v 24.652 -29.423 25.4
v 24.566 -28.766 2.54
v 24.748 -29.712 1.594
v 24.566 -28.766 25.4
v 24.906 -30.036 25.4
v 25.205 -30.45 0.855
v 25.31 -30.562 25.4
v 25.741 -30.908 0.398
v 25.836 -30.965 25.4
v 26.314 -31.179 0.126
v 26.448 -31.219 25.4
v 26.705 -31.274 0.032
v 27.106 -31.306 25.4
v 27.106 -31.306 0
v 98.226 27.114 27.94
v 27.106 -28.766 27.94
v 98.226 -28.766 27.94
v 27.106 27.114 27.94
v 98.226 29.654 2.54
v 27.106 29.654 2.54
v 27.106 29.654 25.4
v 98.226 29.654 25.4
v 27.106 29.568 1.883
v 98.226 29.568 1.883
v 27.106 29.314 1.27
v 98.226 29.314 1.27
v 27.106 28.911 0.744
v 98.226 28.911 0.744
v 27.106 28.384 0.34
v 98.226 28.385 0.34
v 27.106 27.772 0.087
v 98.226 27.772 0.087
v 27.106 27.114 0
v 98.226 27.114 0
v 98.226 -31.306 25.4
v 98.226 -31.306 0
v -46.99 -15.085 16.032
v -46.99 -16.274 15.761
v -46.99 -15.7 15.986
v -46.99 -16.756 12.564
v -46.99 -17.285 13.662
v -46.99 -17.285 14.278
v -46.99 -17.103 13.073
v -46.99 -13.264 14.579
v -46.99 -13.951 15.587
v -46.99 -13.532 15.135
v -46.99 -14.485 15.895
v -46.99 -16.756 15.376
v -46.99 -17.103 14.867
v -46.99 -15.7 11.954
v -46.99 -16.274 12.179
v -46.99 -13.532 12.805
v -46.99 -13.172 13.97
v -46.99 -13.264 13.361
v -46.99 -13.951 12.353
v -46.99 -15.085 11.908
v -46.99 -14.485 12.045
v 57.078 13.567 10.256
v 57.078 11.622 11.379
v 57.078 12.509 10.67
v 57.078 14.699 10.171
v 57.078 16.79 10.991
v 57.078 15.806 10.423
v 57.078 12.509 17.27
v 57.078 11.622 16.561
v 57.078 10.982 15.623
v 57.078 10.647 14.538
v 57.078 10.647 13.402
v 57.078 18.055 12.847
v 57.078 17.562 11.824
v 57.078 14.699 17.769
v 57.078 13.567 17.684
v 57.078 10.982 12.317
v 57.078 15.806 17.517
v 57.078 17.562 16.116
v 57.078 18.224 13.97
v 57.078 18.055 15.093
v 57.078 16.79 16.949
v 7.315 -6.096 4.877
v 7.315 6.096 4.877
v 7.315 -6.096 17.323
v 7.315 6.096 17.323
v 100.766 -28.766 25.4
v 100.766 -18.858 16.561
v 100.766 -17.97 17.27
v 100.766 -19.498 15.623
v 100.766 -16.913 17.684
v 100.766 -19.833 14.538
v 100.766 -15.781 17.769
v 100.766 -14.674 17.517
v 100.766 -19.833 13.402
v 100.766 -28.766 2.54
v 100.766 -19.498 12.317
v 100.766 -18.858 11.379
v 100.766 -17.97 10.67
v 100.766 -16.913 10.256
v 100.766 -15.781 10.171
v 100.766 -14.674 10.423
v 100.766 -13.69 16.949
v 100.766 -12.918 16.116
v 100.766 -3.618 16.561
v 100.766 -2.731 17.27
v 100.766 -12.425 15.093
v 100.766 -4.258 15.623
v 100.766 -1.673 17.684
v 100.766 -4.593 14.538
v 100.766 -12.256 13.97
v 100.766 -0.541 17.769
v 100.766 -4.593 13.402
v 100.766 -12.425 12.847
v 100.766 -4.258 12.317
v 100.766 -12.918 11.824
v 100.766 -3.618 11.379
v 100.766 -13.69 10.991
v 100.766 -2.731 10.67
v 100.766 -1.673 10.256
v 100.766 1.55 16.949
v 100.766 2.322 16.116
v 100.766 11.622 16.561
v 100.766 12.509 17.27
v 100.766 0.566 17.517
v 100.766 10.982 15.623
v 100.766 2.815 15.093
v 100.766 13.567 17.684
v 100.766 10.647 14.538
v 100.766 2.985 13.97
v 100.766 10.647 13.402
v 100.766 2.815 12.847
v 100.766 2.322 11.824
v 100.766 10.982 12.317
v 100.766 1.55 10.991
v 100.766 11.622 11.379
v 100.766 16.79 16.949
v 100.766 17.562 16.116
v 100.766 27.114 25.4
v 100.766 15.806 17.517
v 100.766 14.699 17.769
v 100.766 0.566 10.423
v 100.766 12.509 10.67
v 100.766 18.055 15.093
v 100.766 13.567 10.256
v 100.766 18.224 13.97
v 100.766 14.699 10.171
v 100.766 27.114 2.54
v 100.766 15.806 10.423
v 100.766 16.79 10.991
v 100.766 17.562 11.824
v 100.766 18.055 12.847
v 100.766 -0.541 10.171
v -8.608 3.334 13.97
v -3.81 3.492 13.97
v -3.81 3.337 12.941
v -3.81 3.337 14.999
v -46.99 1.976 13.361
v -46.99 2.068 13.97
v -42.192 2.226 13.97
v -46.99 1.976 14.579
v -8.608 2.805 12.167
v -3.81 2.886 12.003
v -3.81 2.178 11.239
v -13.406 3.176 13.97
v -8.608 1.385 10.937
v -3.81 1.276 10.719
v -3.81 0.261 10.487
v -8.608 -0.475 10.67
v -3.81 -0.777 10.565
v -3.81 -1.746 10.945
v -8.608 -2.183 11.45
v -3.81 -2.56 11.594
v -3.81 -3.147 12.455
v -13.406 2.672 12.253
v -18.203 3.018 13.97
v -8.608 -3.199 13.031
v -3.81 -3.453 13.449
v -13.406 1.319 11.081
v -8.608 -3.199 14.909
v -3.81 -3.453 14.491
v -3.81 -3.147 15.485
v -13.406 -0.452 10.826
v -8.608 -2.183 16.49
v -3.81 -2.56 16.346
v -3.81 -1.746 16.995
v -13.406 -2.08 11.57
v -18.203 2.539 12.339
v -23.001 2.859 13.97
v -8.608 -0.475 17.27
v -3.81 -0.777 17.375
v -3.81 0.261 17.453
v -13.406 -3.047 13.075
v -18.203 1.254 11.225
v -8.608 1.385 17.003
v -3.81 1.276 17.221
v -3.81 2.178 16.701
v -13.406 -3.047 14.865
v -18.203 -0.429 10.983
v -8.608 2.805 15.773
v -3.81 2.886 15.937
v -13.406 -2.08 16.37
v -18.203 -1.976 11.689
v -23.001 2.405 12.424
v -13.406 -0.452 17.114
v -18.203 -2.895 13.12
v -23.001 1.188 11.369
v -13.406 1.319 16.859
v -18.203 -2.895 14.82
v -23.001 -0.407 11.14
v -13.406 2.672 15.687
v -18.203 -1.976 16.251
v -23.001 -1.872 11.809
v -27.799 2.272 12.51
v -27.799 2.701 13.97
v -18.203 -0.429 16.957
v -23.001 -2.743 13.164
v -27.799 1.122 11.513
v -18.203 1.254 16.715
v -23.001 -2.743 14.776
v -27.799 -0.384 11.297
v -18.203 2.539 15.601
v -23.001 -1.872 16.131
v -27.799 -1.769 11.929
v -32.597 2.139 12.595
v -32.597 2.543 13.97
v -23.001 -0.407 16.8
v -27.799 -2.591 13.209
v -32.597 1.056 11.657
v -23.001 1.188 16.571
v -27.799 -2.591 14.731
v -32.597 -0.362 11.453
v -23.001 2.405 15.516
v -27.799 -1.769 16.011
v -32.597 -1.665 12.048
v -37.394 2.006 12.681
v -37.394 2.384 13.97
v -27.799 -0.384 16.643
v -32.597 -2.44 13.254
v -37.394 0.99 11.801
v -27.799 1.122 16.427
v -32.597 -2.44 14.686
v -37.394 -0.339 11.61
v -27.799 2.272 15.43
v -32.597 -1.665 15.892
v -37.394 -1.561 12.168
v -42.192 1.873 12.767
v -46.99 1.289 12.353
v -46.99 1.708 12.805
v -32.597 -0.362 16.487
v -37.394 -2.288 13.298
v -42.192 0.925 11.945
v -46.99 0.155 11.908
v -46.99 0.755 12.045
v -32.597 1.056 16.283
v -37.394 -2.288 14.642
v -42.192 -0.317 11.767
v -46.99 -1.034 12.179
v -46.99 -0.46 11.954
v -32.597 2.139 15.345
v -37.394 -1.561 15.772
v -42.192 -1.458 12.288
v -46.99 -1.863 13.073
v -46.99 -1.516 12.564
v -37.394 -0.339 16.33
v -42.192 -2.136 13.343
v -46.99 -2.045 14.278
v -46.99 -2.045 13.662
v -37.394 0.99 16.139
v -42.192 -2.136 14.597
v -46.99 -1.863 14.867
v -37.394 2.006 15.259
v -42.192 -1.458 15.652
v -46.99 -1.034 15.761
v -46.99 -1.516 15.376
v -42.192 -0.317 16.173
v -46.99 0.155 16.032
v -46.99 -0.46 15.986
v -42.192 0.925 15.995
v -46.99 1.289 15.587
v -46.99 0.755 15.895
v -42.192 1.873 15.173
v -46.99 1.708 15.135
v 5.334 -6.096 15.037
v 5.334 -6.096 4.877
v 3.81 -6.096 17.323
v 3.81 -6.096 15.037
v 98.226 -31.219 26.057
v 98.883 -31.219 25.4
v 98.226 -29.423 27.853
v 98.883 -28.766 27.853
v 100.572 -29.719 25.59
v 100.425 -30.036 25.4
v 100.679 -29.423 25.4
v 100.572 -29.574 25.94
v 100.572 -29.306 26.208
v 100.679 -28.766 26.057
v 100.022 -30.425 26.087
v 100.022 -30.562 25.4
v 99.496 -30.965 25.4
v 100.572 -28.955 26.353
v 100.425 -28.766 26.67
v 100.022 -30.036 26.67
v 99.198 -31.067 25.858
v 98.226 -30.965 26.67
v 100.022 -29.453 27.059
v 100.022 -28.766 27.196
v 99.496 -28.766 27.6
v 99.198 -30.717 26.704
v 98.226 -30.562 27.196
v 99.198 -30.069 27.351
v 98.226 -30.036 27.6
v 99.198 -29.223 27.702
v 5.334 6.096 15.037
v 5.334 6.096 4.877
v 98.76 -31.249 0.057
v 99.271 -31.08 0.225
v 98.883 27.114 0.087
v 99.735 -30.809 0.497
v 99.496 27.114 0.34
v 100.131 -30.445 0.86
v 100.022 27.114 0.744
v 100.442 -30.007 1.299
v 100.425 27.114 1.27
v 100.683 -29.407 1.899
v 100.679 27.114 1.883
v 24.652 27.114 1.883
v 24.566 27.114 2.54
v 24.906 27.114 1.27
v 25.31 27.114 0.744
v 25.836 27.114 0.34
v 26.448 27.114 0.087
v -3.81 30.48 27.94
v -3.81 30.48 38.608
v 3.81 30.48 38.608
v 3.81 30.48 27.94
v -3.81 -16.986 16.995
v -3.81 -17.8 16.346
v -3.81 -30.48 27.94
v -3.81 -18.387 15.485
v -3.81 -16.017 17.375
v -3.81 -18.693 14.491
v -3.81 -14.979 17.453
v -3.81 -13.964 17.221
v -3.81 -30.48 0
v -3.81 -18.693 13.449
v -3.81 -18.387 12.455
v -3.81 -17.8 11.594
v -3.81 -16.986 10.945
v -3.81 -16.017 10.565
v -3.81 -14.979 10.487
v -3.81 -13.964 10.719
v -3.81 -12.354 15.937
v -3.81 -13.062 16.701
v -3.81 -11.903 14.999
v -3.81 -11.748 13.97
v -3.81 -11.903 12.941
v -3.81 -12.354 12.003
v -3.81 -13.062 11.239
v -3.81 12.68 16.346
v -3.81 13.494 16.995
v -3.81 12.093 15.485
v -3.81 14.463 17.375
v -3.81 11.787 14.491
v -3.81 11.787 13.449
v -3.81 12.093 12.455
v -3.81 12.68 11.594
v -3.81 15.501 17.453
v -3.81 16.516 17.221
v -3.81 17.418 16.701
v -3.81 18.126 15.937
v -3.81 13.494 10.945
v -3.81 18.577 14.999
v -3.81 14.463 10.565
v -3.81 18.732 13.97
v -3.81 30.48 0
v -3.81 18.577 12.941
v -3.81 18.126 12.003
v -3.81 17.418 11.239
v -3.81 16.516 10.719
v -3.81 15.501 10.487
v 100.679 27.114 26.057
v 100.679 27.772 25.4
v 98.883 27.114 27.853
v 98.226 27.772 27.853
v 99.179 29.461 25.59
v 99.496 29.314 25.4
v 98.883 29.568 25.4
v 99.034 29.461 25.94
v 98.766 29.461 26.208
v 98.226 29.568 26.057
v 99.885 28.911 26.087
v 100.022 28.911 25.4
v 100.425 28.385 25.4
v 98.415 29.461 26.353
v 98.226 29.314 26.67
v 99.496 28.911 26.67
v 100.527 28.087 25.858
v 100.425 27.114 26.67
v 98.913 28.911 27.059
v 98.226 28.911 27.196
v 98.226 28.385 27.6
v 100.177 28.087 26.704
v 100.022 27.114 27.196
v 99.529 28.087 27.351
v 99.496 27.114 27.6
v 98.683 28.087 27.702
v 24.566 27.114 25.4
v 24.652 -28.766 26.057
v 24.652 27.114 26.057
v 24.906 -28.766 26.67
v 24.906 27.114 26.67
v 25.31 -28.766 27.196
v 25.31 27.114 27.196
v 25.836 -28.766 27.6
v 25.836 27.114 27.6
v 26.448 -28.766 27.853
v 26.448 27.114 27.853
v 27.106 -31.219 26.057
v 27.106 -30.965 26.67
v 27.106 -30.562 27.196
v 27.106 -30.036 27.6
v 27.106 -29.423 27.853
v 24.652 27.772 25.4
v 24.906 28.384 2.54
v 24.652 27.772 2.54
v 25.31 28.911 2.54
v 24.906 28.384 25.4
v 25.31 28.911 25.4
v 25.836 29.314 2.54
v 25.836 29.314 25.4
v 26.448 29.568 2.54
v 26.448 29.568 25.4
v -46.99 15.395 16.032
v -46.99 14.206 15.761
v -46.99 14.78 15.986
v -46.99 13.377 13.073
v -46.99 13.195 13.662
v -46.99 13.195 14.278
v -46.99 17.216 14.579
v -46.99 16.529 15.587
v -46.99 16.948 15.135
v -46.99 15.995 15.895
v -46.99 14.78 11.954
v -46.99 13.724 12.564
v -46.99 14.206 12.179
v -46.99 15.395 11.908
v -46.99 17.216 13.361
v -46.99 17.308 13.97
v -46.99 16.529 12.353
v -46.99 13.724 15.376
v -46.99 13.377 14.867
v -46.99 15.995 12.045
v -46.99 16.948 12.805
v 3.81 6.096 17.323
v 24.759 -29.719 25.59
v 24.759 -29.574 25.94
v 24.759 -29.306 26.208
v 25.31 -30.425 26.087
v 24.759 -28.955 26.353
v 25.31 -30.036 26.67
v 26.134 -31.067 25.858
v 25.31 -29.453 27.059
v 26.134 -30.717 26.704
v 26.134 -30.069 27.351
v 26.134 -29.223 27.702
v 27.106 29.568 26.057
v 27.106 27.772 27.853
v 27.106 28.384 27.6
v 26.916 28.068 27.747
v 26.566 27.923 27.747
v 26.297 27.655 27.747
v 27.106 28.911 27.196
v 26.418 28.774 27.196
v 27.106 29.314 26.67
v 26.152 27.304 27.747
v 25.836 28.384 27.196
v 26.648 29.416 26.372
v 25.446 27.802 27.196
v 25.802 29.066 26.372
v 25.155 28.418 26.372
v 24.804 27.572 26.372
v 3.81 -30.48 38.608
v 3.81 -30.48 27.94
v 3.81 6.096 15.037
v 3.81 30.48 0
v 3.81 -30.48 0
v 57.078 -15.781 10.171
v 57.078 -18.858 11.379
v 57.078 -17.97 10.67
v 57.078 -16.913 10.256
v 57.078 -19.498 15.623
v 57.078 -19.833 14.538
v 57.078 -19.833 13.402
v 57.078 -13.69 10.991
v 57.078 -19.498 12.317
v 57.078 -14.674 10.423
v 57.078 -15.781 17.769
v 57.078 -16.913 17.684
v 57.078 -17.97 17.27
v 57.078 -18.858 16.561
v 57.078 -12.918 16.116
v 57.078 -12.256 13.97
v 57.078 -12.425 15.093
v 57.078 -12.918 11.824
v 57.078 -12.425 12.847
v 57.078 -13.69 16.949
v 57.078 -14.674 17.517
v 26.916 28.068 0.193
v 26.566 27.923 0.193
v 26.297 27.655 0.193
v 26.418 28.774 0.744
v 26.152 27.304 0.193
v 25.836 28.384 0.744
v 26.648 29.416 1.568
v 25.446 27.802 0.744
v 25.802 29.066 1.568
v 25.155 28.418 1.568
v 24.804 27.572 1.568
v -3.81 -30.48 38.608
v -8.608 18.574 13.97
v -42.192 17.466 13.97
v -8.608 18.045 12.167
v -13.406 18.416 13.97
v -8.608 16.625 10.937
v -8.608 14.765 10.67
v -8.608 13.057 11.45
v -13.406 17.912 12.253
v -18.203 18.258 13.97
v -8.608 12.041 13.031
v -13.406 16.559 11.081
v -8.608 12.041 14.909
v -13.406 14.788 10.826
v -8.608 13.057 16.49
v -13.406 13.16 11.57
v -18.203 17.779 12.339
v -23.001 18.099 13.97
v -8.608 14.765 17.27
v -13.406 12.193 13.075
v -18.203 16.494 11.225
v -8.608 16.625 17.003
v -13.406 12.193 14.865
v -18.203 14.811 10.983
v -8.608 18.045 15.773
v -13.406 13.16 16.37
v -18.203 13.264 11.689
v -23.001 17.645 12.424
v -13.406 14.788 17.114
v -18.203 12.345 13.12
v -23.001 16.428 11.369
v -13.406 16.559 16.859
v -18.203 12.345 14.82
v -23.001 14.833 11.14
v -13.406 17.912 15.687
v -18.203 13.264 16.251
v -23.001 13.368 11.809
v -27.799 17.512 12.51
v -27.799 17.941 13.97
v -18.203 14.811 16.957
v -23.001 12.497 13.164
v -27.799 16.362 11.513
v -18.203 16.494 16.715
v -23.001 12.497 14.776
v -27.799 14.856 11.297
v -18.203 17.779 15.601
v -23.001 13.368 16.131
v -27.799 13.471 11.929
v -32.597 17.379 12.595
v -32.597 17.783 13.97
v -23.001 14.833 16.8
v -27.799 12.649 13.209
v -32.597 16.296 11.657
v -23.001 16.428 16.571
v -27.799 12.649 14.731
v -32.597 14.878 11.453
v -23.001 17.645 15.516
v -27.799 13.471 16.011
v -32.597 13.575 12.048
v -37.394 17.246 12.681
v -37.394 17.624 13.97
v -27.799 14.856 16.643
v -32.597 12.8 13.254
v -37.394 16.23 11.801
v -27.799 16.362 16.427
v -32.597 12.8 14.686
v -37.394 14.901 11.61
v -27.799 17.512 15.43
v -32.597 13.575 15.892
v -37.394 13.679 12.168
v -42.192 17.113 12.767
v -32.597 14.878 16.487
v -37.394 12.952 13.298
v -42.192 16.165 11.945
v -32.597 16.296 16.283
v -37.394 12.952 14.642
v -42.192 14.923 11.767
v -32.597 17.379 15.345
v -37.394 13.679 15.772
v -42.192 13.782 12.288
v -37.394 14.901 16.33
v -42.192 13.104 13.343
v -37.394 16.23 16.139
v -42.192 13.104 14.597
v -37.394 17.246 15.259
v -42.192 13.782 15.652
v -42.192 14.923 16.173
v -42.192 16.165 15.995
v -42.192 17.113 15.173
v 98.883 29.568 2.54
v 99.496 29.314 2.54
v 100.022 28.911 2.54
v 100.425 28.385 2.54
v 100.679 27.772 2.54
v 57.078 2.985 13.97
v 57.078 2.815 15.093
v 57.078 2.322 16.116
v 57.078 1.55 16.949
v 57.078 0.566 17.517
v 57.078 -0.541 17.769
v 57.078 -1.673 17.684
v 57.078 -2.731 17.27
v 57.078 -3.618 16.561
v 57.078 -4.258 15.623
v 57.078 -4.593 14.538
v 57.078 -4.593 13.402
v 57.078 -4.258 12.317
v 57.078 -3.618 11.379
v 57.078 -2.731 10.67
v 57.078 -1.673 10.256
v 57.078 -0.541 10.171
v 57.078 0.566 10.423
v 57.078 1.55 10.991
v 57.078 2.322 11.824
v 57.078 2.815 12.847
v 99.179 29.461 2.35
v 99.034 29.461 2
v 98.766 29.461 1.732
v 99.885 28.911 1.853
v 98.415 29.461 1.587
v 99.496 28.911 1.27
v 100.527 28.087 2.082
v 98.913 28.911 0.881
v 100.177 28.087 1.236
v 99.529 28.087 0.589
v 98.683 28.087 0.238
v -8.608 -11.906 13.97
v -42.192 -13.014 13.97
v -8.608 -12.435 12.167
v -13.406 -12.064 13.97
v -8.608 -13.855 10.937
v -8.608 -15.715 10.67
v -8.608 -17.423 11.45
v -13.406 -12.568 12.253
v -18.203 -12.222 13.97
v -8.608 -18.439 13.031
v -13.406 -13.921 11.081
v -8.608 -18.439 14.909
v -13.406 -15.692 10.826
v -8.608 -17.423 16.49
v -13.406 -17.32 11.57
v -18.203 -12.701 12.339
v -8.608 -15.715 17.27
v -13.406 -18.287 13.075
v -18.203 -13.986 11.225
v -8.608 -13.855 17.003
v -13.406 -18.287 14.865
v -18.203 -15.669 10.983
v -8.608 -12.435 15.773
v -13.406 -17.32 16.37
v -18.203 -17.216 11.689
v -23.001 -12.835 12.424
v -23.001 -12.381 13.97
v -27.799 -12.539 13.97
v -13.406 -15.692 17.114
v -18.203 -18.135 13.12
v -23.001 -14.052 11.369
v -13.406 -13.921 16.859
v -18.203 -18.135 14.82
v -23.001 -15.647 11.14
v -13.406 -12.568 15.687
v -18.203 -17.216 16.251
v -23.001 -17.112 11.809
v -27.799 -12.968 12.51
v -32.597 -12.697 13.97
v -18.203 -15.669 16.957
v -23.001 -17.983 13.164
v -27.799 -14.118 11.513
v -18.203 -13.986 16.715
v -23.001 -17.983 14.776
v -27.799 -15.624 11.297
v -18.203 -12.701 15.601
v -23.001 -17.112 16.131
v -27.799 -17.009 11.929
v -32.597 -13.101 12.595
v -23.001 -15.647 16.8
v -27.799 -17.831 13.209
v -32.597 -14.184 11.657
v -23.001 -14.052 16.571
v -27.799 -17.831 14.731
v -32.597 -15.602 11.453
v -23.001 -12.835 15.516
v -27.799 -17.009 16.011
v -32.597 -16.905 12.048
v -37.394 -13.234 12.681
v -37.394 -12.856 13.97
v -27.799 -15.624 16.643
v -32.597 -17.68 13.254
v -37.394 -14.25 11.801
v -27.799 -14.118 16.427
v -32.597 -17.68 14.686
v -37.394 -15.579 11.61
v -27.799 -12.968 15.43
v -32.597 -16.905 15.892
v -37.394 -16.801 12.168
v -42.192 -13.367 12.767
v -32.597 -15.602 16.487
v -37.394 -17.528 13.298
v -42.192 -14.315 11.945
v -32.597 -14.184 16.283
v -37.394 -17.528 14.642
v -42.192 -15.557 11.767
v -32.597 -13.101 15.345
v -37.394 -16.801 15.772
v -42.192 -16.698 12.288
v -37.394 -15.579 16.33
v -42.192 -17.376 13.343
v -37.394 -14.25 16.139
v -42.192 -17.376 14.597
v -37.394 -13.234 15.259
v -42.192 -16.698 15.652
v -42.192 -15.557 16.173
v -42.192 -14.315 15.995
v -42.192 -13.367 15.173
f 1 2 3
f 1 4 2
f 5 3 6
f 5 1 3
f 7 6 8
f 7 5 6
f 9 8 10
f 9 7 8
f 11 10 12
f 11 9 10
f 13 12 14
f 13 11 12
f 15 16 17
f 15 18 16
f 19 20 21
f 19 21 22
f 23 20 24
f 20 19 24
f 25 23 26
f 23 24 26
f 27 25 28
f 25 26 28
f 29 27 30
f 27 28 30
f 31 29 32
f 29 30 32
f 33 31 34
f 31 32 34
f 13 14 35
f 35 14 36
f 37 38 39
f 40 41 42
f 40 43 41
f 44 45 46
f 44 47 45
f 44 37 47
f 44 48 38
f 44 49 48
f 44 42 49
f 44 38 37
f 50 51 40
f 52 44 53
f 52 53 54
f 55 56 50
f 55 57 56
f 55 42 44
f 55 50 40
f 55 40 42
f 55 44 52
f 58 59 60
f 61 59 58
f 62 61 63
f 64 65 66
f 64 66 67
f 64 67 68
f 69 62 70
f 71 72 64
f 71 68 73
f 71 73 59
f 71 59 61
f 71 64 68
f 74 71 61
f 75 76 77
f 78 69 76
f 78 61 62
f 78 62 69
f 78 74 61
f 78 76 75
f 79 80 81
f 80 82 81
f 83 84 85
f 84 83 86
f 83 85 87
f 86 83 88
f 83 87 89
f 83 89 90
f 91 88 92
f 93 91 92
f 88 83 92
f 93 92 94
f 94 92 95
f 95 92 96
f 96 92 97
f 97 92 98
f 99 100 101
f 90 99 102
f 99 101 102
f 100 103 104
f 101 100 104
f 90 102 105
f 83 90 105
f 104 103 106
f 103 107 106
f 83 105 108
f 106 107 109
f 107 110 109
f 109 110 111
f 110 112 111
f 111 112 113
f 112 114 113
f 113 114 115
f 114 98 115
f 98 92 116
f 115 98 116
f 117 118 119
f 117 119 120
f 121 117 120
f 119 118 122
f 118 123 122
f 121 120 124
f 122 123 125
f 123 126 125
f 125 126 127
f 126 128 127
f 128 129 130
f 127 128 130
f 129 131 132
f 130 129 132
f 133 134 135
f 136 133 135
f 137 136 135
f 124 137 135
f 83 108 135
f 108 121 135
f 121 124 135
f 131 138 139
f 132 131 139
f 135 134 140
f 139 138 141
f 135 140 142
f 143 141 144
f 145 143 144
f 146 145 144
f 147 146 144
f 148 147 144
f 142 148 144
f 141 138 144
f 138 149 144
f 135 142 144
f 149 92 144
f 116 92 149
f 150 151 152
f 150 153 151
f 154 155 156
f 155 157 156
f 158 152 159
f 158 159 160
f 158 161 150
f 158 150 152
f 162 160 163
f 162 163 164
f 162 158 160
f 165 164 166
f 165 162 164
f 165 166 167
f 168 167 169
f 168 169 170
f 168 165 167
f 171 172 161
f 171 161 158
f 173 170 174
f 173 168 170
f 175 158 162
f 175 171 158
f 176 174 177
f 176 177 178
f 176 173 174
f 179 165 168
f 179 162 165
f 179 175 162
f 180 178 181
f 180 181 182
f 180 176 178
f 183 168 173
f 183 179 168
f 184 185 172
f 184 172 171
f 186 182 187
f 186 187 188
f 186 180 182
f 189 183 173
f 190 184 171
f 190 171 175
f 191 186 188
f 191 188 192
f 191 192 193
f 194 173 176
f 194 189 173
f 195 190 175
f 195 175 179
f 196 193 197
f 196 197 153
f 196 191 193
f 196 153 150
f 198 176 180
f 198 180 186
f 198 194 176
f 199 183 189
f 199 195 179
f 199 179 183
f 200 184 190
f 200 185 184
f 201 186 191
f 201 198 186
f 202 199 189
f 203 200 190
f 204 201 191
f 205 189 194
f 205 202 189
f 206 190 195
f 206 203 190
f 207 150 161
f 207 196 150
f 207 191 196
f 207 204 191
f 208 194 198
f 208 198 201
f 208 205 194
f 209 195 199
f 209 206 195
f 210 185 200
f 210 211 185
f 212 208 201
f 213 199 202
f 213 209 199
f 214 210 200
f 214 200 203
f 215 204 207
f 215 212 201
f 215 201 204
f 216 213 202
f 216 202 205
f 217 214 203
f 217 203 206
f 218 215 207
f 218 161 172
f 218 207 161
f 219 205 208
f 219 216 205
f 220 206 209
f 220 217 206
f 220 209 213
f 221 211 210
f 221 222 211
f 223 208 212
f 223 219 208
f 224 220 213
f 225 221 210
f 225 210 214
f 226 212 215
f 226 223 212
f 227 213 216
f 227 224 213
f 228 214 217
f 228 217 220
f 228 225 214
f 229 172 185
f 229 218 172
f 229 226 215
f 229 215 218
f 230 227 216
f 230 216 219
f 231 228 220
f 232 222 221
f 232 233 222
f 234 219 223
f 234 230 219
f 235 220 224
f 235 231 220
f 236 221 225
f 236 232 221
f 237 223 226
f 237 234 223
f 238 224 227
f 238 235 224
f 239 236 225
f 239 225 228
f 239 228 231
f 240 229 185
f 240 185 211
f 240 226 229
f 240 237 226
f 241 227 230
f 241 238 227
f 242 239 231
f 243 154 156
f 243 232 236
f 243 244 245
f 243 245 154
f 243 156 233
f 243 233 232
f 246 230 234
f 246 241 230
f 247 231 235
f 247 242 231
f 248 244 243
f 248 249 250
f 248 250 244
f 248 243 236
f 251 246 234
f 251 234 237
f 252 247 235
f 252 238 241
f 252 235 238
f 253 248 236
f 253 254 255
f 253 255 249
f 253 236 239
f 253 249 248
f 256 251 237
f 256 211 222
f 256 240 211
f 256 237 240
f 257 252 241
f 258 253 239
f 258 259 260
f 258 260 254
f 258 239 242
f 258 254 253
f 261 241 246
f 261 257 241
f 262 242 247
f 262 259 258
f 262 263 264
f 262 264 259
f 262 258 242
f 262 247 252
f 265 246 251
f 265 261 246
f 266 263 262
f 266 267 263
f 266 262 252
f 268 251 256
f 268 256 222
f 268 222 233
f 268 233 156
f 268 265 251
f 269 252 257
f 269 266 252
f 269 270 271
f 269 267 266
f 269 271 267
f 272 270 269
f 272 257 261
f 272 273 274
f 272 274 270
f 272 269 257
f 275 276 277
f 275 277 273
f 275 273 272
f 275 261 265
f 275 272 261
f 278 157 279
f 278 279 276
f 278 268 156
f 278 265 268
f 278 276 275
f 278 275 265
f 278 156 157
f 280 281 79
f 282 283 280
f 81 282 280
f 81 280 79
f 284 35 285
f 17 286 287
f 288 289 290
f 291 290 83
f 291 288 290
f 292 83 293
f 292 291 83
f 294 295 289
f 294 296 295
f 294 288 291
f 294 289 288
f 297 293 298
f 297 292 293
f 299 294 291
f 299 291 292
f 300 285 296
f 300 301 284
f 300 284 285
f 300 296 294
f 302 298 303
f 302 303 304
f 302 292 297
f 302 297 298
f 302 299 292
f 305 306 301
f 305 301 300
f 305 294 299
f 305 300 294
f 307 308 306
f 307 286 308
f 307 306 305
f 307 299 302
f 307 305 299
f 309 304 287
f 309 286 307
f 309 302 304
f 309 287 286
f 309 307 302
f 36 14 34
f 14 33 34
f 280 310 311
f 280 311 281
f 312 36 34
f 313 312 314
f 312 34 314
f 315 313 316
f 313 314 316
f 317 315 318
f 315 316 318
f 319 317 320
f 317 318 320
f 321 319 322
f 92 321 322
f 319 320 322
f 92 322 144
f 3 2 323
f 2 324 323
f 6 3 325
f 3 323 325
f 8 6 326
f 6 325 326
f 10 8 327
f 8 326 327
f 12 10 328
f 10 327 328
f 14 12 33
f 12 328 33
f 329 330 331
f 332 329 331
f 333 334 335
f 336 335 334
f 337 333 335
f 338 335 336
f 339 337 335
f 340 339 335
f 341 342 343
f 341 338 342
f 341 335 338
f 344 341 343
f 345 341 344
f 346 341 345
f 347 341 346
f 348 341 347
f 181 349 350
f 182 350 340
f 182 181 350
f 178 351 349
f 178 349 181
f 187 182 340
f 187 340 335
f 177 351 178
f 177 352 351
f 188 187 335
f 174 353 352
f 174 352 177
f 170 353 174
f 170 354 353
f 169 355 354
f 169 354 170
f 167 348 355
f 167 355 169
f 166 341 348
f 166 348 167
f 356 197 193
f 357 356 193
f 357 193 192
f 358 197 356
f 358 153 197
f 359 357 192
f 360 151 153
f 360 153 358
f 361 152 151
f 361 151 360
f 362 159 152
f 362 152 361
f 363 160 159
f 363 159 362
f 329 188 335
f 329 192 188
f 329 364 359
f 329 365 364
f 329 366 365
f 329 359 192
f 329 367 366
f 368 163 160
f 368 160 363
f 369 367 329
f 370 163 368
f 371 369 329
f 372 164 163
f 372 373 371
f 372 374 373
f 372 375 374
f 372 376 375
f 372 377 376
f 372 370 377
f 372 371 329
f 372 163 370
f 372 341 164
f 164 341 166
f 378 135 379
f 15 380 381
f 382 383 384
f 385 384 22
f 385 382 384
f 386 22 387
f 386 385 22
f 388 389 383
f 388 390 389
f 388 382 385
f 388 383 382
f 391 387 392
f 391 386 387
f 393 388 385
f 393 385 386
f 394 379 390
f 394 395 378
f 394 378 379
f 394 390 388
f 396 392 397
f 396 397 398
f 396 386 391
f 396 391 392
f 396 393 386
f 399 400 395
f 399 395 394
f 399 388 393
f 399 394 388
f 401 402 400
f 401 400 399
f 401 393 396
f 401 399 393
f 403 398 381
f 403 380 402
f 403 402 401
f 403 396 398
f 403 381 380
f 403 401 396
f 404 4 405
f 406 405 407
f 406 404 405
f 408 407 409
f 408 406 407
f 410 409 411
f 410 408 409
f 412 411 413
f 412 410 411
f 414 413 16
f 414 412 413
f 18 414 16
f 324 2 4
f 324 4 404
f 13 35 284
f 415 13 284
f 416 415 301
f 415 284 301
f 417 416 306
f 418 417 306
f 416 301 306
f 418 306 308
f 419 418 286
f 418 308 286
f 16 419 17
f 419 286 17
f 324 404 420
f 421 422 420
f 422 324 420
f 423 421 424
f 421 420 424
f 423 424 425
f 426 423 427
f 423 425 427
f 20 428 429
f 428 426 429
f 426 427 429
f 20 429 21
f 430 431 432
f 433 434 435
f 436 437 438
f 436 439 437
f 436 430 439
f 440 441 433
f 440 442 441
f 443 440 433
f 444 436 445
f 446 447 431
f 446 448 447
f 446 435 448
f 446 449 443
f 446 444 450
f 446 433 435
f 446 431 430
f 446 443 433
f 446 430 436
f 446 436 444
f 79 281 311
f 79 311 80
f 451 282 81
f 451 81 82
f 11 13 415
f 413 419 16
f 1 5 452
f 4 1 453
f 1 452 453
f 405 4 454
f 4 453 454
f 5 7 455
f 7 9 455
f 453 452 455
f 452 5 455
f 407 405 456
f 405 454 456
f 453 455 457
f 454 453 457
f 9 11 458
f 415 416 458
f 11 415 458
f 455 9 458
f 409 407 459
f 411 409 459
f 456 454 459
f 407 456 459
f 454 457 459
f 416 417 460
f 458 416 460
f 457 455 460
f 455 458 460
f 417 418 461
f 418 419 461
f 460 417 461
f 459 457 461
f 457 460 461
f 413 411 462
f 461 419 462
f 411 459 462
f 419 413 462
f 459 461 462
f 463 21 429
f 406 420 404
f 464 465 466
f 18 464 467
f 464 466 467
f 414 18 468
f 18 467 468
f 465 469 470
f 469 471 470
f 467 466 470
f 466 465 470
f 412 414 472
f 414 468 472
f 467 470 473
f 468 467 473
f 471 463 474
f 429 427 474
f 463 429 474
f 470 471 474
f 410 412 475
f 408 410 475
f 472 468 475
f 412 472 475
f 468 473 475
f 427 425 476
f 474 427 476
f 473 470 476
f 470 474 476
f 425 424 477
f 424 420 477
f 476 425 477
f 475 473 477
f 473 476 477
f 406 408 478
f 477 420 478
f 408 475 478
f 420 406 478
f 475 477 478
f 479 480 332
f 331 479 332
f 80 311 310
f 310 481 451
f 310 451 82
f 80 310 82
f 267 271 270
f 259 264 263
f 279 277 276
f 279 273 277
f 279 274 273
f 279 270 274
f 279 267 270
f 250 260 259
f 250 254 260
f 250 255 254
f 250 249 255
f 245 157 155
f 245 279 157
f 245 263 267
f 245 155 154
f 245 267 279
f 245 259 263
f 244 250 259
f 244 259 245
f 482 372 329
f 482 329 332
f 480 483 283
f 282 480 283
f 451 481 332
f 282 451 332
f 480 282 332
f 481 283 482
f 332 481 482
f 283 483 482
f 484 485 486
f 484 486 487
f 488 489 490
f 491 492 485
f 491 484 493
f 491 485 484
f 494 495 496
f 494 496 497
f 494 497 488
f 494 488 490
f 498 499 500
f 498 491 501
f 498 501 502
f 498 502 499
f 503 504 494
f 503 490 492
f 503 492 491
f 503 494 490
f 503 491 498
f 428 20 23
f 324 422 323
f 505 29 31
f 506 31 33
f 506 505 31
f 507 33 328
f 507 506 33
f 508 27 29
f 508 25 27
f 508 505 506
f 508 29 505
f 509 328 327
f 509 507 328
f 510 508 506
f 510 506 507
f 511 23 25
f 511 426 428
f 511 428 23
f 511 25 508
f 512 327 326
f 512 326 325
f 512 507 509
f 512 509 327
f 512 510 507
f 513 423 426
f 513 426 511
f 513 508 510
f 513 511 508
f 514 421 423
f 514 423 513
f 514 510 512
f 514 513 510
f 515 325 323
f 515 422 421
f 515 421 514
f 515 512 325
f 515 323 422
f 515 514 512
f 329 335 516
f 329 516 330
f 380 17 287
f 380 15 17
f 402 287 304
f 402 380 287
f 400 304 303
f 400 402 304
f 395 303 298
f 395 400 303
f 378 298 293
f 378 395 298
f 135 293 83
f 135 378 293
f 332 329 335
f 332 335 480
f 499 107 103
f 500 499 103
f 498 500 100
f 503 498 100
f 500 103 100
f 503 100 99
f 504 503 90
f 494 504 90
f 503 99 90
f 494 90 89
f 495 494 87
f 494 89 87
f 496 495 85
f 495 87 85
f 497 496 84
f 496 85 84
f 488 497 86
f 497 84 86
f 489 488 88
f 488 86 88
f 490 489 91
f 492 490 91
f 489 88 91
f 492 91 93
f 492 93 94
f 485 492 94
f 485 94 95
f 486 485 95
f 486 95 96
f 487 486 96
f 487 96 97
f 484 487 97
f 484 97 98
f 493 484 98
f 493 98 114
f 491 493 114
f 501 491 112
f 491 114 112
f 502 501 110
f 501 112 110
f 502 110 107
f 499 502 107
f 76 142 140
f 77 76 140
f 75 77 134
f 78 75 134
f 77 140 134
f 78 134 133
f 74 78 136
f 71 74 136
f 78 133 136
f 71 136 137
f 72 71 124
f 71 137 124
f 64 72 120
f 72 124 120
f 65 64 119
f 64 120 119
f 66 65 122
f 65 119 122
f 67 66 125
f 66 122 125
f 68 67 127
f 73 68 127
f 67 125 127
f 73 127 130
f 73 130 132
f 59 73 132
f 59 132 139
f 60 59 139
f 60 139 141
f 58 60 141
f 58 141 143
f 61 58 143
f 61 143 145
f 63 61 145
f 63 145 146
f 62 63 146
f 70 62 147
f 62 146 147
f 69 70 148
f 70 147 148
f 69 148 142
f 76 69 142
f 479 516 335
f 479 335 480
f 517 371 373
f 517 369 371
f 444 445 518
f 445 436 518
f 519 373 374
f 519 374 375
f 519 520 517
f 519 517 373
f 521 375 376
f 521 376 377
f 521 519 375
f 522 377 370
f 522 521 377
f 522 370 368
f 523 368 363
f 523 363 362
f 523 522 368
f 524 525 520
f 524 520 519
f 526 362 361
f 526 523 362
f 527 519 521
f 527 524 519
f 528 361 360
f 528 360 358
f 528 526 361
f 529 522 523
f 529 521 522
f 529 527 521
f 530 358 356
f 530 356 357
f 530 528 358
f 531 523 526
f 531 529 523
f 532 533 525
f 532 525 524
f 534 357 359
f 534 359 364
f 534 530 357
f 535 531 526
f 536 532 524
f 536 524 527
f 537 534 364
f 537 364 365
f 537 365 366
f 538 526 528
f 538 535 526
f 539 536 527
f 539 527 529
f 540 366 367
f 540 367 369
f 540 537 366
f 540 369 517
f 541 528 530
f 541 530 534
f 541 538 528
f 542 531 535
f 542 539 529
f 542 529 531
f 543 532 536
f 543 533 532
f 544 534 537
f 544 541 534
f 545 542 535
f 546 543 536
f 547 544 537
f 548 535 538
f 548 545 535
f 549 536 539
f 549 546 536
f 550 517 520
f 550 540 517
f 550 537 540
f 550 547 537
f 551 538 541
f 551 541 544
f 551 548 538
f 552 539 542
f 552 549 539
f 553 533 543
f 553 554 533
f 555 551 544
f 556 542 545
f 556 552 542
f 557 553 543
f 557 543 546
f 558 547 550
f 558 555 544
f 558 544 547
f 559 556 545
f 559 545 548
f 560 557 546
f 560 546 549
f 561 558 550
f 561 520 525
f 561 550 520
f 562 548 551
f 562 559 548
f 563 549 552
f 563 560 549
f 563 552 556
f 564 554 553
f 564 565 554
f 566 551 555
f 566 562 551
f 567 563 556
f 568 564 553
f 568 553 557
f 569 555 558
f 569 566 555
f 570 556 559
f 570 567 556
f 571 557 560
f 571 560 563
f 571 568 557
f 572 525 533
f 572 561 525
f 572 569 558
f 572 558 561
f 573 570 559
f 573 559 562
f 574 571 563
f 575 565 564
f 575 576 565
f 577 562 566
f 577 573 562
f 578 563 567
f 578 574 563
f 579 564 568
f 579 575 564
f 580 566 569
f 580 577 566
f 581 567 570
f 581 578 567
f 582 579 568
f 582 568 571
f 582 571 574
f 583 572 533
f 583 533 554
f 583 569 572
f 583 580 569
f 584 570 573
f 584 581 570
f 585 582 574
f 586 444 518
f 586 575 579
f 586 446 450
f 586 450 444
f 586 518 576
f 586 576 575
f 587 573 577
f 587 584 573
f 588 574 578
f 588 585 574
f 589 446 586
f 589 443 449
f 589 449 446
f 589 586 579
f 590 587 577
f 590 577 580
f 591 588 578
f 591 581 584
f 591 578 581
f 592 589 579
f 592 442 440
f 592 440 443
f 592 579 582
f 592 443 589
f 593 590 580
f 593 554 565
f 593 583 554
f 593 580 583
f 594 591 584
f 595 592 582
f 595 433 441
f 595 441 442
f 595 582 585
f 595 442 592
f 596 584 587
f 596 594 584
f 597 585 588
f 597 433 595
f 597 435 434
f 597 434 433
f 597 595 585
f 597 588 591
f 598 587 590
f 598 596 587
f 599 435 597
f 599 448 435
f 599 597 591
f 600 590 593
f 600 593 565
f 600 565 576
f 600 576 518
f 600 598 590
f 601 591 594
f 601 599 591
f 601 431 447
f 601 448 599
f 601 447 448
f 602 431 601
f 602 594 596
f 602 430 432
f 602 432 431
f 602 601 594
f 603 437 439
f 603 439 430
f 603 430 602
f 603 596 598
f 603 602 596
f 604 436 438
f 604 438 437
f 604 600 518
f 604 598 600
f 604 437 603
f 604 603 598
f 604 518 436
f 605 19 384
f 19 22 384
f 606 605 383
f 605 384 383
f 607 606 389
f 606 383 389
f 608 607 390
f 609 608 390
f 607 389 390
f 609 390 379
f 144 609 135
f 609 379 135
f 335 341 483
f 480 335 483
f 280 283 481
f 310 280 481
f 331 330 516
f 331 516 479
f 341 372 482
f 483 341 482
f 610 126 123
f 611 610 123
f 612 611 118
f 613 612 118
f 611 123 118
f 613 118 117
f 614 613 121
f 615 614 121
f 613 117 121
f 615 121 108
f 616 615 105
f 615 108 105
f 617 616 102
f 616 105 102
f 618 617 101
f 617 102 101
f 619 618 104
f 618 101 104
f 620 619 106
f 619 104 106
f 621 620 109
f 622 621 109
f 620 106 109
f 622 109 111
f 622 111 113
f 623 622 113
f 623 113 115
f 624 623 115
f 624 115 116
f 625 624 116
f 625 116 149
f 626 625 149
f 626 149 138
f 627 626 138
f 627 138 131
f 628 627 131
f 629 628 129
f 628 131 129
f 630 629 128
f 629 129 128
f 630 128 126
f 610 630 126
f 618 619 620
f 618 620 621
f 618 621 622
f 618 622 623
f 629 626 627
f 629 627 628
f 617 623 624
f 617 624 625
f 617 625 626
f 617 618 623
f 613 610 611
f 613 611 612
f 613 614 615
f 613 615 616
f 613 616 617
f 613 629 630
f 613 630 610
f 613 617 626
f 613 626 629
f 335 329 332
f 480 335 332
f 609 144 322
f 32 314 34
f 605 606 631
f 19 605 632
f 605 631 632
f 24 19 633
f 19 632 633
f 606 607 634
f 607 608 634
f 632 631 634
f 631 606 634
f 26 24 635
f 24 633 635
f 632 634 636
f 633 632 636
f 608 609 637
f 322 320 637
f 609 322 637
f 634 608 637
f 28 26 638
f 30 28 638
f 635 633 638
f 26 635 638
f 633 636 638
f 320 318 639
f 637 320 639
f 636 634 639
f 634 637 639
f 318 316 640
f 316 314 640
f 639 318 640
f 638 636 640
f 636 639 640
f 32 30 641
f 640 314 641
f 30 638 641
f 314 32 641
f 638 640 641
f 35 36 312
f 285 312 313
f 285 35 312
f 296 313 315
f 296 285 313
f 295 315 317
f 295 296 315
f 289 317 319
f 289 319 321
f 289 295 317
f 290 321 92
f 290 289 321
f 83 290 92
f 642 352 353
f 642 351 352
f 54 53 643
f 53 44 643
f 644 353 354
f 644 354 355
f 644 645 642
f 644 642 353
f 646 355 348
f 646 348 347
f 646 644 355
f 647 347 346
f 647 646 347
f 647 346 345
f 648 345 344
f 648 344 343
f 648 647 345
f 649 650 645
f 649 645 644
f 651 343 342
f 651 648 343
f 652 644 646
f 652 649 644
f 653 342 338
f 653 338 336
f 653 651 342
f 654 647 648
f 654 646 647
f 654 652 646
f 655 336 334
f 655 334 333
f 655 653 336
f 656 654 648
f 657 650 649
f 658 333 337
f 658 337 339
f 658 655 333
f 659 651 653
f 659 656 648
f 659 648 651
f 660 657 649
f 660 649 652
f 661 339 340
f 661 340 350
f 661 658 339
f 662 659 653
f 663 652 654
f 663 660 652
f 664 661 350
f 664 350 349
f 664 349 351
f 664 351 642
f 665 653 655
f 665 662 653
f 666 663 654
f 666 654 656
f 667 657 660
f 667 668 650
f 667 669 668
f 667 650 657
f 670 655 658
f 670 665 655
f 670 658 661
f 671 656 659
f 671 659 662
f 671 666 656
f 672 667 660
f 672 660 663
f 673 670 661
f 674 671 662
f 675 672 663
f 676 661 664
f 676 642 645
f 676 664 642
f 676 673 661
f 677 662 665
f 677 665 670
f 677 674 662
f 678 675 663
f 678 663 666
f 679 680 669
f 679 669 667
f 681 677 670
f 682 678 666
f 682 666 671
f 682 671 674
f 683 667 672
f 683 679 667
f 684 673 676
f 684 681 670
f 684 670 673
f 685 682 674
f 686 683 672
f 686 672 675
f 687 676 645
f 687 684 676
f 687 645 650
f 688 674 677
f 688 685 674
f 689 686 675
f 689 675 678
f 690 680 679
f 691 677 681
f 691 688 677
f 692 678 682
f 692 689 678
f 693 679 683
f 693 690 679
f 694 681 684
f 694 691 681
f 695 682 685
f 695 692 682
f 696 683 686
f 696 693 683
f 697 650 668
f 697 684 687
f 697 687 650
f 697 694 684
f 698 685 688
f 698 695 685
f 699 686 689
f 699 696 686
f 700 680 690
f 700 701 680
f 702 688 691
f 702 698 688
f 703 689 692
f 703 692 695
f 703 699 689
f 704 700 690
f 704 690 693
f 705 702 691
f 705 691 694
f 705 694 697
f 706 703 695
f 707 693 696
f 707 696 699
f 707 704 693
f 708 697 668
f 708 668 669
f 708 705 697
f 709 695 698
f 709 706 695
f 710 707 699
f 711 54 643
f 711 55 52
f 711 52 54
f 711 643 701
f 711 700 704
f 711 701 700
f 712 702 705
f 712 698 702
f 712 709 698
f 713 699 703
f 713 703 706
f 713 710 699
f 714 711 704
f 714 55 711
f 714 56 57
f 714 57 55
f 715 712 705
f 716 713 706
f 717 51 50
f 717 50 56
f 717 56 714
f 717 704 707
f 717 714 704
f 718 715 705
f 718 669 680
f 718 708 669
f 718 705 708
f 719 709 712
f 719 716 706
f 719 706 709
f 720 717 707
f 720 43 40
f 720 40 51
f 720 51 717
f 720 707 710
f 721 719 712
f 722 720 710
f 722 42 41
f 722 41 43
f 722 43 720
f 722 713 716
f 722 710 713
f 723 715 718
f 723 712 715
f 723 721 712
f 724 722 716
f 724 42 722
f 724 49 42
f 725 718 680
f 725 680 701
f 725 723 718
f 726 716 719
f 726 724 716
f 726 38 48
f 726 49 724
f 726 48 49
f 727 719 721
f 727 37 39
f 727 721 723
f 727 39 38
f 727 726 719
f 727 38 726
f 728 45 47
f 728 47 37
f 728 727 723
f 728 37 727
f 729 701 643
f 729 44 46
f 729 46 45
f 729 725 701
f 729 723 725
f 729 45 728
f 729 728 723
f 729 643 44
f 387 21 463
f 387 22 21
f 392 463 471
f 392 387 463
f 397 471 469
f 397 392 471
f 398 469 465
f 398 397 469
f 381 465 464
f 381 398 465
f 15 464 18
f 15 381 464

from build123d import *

# Parameters (mm, degrees)
F0_W      = 7.62
F0_H      = 60.96
F1_DEPTH  = 27.94
F0_W_2    = 76.2
F2_DEPTH  = 10.668
F4_DEPTH  = 43.688
F6_DEPTH  = 43.18
F6_TAPER  = 1.89
F7_R      = 2.54
F8_W      = 12.192
F8_H      = 2.286
F9_DEPTH  = 3.5052
F10_W     = 1.9812
F10_H     = 12.192
F11_DEPTH = 10.16


with BuildPart() as f1:
    # F0 (on Top) → F1 (new body)
    with BuildSketch(Plane.XY):
        Rectangle(F0_W, F0_H)
    extrude(amount=F1_DEPTH)


with BuildPart() as f1b:
    # F0 (on Top) → F1, piece 2 (new body)
    with BuildSketch(Plane.XY):
        with Locations((62.6656780899, -0.8255)):
            Rectangle(F0_W_2, F0_H)
    extrude(amount=F1_DEPTH)

    # F3 (on face) → F4 (cut)
    with BuildSketch(Plane.YZ.offset(100.7656780899)):
        with BuildLine():
            Line((-16.0655, 13.97), (-19.8755, 13.97))
            ThreePointArc((-19.8755, 13.97), (-16.0655, 10.16), (-12.2555, 13.97))
            Line((-12.2555, 13.97), (-16.0655, 13.97))
        make_face()
        with BuildLine():
            ThreePointArc((-12.2555, 13.97), (-16.0655, 17.78), (-19.8755, 13.97))
            Line((-19.8755, 13.97), (-16.0655, 13.97))
            Line((-16.0655, 13.97), (-12.2555, 13.97))
        make_face()
        with BuildLine():
            Line((-0.8255, 13.97), (-4.6355, 13.97))
            ThreePointArc((-4.6355, 13.97), (-0.8255, 10.16), (2.9845, 13.97))
            Line((2.9845, 13.97), (-0.8255, 13.97))
        make_face()
        with BuildLine():
            ThreePointArc((2.9845, 13.97), (-0.8255, 17.78), (-4.6355, 13.97))
            Line((-4.6355, 13.97), (-0.8255, 13.97))
            Line((-0.8255, 13.97), (2.9845, 13.97))
        make_face()
        with BuildLine():
            ThreePointArc((10.6045, 13.97), (14.4145, 10.16), (18.2245, 13.97))
            Line((18.2245, 13.97), (14.4145, 13.97))
            Line((14.4145, 13.97), (10.6045, 13.97))
        make_face()
        with BuildLine():
            Line((14.4145, 13.97), (18.2245, 13.97))
            ThreePointArc((18.2245, 13.97), (14.4145, 17.78), (10.6045, 13.97))
            Line((10.6045, 13.97), (14.4145, 13.97))
        make_face()
    extrude(amount=-F4_DEPTH, mode=Mode.SUBTRACT)

    # F7
    f7_edges = [f1b.edges().sort_by_distance(p)[0] for p in [
        (62.665678, -31.3055, 27.94),
        (100.765678, -31.3055, 13.97),
        (100.765678, -0.8255, 27.94),
        (100.765678, -0.8255, 0),
        (100.765678, 29.6545, 13.97),
        (24.565678, 29.6545, 13.97),
        (62.665678, 29.6545, 0),
        (62.665678, 29.6545, 27.94),
        (24.565678, -31.3055, 13.97),
        (24.565678, -0.8255, 0),
        (24.565678, -0.8255, 27.94),
    ]]
    fillet(f7_edges, radius=F7_R)


with BuildPart() as f2:
    # F2 (new): a face of the model
    f2_faces = [f1.part.faces().sort_by_distance(p)[0] for p in [
        (0, 0, 27.94),
    ]]
    extrude(f2_faces, amount=F2_DEPTH)


with BuildPart() as f1_1:
    add(f1.part)

    # F5 (on face) → F6 (join)
    with BuildSketch(Plane(origin=(-3.81, 0, 0), x_dir=(0, -1, 0), z_dir=(-1, 0, 0))):
        with BuildLine():
            ThreePointArc((-11.7475, 13.97), (-15.24, 17.4625), (-18.7325, 13.97))
            Line((-18.7325, 13.97), (-15.24, 13.97))
            Line((-15.24, 13.97), (-11.7475, 13.97))
        make_face()
        with BuildLine():
            ThreePointArc((18.7325, 13.97), (15.24, 17.4625), (11.7475, 13.97))
            Line((11.7475, 13.97), (15.24, 13.97))
            Line((15.24, 13.97), (18.7325, 13.97))
        make_face()
        with BuildLine():
            Line((15.24, 13.97), (11.7475, 13.97))
            ThreePointArc((11.7475, 13.97), (15.24, 10.4775), (18.7325, 13.97))
            Line((18.7325, 13.97), (15.24, 13.97))
        make_face()
        with BuildLine():
            ThreePointArc((3.4925, 13.97), (0, 17.4625), (-3.4925, 13.97))
            Line((-3.4925, 13.97), (0, 13.97))
            Line((0, 13.97), (3.4925, 13.97))
        make_face()
        with BuildLine():
            Line((0, 13.97), (-3.4925, 13.97))
            ThreePointArc((-3.4925, 13.97), (0, 10.4775), (3.4925, 13.97))
            Line((3.4925, 13.97), (0, 13.97))
        make_face()
        with BuildLine():
            Line((-15.24, 13.97), (-18.7325, 13.97))
            ThreePointArc((-18.7325, 13.97), (-15.24, 10.4775), (-11.7475, 13.97))
            Line((-11.7475, 13.97), (-15.24, 13.97))
        make_face()
    extrude(amount=F6_DEPTH, taper=F6_TAPER)

    # F8 (on face) → F9 (join)
    with BuildSketch(Plane.YZ.offset(3.81)):
        with Locations((0, 16.1798)):
            Rectangle(F8_W, F8_H)
    extrude(amount=F9_DEPTH)

    # F10 (on face) → F11 (join)
    with BuildSketch(Plane(origin=(0, 0, 15.0368), x_dir=(1, 0, 0), z_dir=(0, 0, -1))):
        with Locations((6.3246, 0)):
            Rectangle(F10_W, F10_H)
    extrude(amount=F11_DEPTH)


solid = Compound([f1b.part, f2.part, f1_1.part])
